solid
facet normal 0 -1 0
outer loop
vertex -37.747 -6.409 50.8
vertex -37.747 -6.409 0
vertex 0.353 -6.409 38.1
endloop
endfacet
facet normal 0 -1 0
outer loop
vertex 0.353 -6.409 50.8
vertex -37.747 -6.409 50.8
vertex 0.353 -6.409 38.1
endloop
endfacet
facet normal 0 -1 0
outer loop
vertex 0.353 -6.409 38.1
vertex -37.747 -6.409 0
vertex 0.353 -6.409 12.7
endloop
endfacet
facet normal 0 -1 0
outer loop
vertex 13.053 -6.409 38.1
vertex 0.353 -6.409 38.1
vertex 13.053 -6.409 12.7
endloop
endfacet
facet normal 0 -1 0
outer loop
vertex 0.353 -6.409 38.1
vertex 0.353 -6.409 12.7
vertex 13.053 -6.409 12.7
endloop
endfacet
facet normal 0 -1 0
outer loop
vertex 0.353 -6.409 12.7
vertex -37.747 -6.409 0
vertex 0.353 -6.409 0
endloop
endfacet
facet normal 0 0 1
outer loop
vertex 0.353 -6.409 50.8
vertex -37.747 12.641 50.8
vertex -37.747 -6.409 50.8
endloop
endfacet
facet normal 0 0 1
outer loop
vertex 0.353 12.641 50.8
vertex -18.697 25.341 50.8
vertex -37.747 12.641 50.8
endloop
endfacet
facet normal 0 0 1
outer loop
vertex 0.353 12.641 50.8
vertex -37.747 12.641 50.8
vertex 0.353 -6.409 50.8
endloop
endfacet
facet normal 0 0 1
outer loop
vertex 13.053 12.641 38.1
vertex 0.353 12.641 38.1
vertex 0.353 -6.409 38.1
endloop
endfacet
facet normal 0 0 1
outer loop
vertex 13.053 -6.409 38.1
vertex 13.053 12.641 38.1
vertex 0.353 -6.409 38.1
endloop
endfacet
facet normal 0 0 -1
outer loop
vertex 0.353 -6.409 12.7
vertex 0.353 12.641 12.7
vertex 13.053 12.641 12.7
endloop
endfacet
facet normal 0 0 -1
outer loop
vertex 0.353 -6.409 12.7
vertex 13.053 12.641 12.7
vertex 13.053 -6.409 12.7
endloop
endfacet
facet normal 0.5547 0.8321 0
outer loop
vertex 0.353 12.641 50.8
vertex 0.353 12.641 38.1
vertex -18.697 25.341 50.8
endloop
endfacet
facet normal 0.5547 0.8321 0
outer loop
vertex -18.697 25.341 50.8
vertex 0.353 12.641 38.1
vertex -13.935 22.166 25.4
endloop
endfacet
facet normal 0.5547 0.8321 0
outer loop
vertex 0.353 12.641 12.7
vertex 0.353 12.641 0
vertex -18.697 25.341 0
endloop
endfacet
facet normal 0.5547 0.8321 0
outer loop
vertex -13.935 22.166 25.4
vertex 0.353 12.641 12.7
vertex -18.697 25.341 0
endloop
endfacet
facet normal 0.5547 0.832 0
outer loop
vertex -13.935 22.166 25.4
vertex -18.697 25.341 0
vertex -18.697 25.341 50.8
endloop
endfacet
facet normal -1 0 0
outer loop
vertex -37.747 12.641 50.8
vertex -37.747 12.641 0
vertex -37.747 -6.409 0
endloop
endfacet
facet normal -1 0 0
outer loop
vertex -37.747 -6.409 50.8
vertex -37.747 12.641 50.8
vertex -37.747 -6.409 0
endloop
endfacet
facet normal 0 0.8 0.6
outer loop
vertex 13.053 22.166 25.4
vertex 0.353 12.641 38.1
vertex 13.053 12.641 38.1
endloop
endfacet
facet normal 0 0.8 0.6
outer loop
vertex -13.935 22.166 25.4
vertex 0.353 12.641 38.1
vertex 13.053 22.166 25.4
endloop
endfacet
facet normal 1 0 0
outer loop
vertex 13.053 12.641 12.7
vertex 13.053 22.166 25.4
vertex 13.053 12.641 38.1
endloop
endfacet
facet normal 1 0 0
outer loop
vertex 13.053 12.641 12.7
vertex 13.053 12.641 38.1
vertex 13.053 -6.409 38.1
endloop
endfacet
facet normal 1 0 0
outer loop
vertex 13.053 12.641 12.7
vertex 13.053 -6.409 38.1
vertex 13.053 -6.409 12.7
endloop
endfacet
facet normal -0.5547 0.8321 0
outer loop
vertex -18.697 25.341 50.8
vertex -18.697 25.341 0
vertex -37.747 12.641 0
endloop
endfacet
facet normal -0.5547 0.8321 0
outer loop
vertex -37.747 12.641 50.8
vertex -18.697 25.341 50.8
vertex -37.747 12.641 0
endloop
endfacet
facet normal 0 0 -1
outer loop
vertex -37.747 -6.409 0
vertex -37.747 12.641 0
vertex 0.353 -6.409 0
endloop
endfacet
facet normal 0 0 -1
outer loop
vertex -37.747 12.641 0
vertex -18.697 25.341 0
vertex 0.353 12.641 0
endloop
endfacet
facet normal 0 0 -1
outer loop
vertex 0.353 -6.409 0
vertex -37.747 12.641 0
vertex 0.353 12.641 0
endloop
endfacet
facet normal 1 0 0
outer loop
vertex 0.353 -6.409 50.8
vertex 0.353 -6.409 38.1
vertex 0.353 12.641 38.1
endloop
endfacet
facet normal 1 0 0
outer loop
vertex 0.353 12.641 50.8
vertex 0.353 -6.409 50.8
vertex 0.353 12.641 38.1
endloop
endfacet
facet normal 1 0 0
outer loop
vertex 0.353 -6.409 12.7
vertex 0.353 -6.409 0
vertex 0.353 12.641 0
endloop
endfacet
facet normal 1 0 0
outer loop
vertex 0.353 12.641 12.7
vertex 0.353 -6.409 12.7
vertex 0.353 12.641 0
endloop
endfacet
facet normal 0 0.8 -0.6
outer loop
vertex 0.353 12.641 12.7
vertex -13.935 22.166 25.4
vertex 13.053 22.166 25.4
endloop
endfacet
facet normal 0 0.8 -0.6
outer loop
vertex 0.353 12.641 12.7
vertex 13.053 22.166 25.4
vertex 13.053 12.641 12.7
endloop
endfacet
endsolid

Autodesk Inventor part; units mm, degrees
ref_plane "YZ Plane" through (0, 0, 0) normal (1, 0, 0) x (0, 1, 0)
ref_plane "XZ Plane" through (0, 0, 0) normal (0, 1, 0) x (-1, 0, 0)
ref_plane "XY Plane" through (0, 0, 0) normal (0, 0, 1) x (1, 0, 0)
sketch "Sketch1" plane through (0, 0, 0) normal (0, 0, 1) x (1, 0, 0)
  line L0 (-37.7472, -6.4088) -> (0.3528, -6.4088)
  line L1 (0.3528, -6.4088) -> (0.3528, 12.6412)
  line L2 (0.3528, 12.6412) -> (-18.6972, 25.3412)
  line L3 (-18.6972, 25.3412) -> (-37.7472, 12.6412)
  line L4 (-37.7472, 12.6412) -> (-37.7472, -6.4088)
  point P0 (0, 0)
  dimension "d0" = 19.05
  dimension "d1" = 19.05
  dimension "d2" = 38.1
  dimension "d3" = 12.7
  dimension "d4" = 19.05
extrude "Extrusion1" add sketch "Sketch1" along normal blind 50.8
sketch "Sketch2" plane through (0.3528, -6.4088, 0) normal (1, 0, 0) x (0, 0, -1)
  line L0 (0, 19.05) -> (-50.8, 19.05) projected
  line L1 (-38.1, 19.05) -> (-38.1, 0)
  line L2 (0, 0) -> (-50.8, 0) projected
  line L3 (-38.1, 19.05) -> (-25.4, 28.575)
  line L4 (-25.4, 28.575) -> (-12.7, 19.05)
  line L5 (-12.7, 19.05) -> (-12.7, 0)
  line L6 (-12.7, 0) -> (-38.1, 0)
  line L7 (-50.8, 19.05) -> (-50.8, 0) projected
  line L8 (0, 0) -> (0, 19.05) projected
  point P0 (0, 6.4088)
  dimension "d7" = 12.7
  dimension "d8" = 12.7
  dimension "d9" = 9.525
  dimension "d10" = 12.7
extrude "Extrusion2" add sketch "Sketch2" along normal blind 12.7 and the other way blind 17.78 contours L5 L2 L1 L0 | L0 L3 L4
properties part number "Figure 7_28_5"
